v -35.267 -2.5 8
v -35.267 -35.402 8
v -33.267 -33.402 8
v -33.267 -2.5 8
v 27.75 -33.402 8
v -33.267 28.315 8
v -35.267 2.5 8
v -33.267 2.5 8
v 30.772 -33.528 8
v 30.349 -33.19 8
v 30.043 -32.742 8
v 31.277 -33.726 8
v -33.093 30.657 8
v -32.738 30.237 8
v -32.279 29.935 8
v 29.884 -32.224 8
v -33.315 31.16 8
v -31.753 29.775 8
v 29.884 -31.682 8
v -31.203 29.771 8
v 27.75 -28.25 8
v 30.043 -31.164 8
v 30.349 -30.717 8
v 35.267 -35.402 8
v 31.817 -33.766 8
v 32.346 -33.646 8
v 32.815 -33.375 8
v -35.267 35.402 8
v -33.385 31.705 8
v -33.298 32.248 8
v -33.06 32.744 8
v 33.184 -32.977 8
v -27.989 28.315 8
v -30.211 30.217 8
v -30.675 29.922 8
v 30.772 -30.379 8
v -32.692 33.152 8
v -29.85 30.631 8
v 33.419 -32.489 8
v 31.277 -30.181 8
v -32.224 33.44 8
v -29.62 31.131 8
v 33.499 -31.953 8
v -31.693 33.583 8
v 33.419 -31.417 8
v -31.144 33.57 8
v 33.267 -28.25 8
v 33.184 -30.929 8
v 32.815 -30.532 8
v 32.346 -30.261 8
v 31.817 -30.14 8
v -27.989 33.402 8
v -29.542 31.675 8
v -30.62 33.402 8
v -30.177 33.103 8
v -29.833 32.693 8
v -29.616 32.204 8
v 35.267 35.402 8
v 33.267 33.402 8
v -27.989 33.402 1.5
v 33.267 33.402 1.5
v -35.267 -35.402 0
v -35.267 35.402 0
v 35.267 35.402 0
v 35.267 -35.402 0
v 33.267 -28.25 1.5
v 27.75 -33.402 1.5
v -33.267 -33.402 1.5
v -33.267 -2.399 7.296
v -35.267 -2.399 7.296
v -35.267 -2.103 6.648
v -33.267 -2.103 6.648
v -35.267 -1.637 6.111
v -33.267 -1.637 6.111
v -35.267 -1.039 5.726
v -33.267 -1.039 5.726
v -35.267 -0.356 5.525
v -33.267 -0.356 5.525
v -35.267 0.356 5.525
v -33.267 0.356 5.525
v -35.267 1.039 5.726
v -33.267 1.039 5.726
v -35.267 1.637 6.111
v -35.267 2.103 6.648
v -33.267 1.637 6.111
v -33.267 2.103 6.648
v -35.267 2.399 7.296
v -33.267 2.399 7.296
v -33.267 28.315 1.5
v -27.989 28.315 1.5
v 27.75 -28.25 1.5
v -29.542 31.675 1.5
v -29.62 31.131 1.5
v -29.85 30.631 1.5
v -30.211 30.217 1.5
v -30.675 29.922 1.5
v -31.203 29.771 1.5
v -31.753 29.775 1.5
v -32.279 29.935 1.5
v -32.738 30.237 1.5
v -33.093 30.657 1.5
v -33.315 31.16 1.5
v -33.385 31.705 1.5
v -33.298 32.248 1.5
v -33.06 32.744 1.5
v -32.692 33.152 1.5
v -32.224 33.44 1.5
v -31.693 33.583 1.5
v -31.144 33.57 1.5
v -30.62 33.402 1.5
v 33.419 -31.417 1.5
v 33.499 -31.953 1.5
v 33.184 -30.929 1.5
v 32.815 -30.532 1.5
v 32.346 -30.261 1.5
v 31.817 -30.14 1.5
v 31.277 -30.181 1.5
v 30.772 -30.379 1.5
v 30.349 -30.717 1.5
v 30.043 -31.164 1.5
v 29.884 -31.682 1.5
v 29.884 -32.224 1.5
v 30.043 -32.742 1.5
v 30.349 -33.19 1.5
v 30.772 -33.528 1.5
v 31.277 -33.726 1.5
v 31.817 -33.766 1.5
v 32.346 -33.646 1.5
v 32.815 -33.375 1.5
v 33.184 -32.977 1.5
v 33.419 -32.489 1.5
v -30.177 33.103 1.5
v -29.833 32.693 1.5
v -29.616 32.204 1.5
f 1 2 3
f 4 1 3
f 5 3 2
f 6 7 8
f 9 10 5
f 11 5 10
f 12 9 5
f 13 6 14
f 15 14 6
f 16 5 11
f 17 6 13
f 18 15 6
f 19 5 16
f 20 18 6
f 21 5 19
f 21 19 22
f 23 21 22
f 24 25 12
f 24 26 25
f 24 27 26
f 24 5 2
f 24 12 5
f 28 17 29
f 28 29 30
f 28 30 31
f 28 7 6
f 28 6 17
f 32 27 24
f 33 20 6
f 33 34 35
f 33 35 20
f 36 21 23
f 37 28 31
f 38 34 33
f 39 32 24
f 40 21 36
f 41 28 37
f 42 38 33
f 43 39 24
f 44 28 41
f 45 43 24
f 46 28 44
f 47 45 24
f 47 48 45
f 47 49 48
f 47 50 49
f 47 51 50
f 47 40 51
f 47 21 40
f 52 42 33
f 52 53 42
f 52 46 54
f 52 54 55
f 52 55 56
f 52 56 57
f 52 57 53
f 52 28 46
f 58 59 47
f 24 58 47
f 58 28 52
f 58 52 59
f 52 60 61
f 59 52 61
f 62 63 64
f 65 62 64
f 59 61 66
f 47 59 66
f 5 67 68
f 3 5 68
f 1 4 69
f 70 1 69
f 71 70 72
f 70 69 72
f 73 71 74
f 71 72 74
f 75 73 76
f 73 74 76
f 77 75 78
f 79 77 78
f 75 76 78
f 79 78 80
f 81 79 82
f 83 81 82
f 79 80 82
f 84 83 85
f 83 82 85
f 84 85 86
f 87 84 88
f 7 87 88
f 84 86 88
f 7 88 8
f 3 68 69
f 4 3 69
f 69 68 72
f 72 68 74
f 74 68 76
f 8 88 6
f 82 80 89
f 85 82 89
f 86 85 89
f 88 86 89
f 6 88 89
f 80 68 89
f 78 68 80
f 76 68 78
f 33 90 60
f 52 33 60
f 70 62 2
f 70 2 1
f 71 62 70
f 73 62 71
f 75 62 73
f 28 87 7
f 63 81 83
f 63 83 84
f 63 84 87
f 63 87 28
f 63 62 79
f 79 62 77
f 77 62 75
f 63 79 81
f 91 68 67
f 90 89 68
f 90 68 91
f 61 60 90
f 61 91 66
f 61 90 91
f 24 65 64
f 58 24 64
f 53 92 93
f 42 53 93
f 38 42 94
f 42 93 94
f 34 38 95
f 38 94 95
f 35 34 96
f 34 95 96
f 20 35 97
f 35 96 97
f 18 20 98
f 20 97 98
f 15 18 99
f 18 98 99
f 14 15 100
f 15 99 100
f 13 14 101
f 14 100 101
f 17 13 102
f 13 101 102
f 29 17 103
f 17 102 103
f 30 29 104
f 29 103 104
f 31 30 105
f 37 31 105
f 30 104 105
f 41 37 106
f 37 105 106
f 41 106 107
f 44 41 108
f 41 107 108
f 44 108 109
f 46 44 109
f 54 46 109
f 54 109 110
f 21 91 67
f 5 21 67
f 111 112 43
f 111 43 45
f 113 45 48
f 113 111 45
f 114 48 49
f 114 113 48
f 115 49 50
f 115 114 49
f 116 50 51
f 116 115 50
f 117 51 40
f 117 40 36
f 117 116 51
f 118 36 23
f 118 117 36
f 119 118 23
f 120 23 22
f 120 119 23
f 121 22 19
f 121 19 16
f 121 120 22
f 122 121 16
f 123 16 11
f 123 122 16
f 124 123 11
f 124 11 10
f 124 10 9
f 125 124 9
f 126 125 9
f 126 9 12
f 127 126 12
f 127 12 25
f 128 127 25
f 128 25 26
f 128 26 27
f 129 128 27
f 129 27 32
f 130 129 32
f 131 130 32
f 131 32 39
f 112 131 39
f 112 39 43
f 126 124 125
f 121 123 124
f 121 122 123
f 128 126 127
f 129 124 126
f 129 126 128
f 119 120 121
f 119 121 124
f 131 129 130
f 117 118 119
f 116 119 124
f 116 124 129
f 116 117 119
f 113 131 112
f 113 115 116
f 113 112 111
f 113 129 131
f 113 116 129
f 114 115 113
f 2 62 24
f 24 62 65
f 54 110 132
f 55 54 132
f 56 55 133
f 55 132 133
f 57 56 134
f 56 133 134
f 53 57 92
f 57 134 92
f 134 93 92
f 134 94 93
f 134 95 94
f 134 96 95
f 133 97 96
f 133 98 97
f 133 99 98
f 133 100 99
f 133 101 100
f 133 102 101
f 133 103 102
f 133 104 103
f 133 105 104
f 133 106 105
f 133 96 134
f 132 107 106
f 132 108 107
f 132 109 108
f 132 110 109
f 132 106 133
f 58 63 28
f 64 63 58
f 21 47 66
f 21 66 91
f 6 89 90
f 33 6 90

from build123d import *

# Parameters (mm, degrees)
F0_W     = 70.5344155431
F0_H     = 70.8036422729
F0_R     = 1.8180060759
F1_DEPTH = 1.5
F2_DEPTH = 8
F4_D     = 5
F4_DEPTH = 10
F4_TIP   = 1.5021515476


# Not quite as in the source:
# - a feature names something its author has since deleted; it is built from what else it names


with BuildPart() as f1:
    # F0 (on Top) → F1 (new body)
    with BuildSketch(Plane.XY):
        Rectangle(F0_W, F0_H)
        with Locations((31.6813939209, -31.9532230342)):
            Circle(F0_R, mode=Mode.SUBTRACT)
        Polygon((-27.9887095094, 33.4018211365), (33.2672077715, 33.4018211365), (33.2672077715, -28.2499678433), (27.7495980263, -28.2499678433), (27.7495980263, -33.4018211365), (-33.2672077715, -33.4018211365), (-33.2672077715, 28.315147385), (-27.9887095094, 28.315147385), align=None, mode=Mode.SUBTRACT)
        with BuildLine():
            ThreePointArc((-30.620154253, 33.4018211365), (-29.8333233875, 32.6929228695), (-29.5415057982, 31.6748452405))
            ThreePointArc((-29.5415057982, 31.6748452405), (-33.093320688, 30.6567676116), (-30.620154253, 33.4018211365))
        make_face(mode=Mode.SUBTRACT)
        Polygon((33.2672077715, -28.2499678433), (33.2672077715, 33.4018211365), (-27.9887095094, 33.4018211365), (-27.9887095094, 28.315147385), (-33.2672077715, 28.315147385), (-33.2672077715, -33.4018211365), (27.7495980263, -33.4018211365), (27.7495980263, -28.2499678433), align=None)
        with BuildLine():
            ThreePointArc((-30.620154253, 33.4018211365), (-33.093320688, 30.6567676116), (-29.5415057982, 31.6748452405))
            ThreePointArc((-29.5415057982, 31.6748452405), (-29.8333233875, 32.6929228695), (-30.620154253, 33.4018211365))
        make_face()
        with Locations((31.6813939209, -31.9532230342)):
            Circle(F0_R)
    extrude(amount=F1_DEPTH)

    # F0 (on Top) → F2 (join)
    with BuildSketch(Plane.XY):
        Rectangle(F0_W, F0_H)
        with Locations((31.6813939209, -31.9532230342)):
            Circle(F0_R, mode=Mode.SUBTRACT)
        Polygon((-27.9887095094, 33.4018211365), (33.2672077715, 33.4018211365), (33.2672077715, -28.2499678433), (27.7495980263, -28.2499678433), (27.7495980263, -33.4018211365), (-33.2672077715, -33.4018211365), (-33.2672077715, 28.315147385), (-27.9887095094, 28.315147385), align=None, mode=Mode.SUBTRACT)
        with BuildLine():
            ThreePointArc((-30.620154253, 33.4018211365), (-29.8333233875, 32.6929228695), (-29.5415057982, 31.6748452405))
            ThreePointArc((-29.5415057982, 31.6748452405), (-33.093320688, 30.6567676116), (-30.620154253, 33.4018211365))
        make_face(mode=Mode.SUBTRACT)
    extrude(amount=F2_DEPTH)

    # F4
    with Locations(Plane(origin=(-35.2672077715, 0, 0), x_dir=(0, -1, 0), z_dir=(-1, 0, 0))):
        with Locations((0, 8)):
            Hole(F4_D / 2, depth=F4_DEPTH)
            with Locations((0, 0, -(F4_DEPTH + F4_TIP / 2))):  # 118° drill point
                Cone(0, F4_D / 2, F4_TIP, mode=Mode.SUBTRACT)


solid = f1.part
